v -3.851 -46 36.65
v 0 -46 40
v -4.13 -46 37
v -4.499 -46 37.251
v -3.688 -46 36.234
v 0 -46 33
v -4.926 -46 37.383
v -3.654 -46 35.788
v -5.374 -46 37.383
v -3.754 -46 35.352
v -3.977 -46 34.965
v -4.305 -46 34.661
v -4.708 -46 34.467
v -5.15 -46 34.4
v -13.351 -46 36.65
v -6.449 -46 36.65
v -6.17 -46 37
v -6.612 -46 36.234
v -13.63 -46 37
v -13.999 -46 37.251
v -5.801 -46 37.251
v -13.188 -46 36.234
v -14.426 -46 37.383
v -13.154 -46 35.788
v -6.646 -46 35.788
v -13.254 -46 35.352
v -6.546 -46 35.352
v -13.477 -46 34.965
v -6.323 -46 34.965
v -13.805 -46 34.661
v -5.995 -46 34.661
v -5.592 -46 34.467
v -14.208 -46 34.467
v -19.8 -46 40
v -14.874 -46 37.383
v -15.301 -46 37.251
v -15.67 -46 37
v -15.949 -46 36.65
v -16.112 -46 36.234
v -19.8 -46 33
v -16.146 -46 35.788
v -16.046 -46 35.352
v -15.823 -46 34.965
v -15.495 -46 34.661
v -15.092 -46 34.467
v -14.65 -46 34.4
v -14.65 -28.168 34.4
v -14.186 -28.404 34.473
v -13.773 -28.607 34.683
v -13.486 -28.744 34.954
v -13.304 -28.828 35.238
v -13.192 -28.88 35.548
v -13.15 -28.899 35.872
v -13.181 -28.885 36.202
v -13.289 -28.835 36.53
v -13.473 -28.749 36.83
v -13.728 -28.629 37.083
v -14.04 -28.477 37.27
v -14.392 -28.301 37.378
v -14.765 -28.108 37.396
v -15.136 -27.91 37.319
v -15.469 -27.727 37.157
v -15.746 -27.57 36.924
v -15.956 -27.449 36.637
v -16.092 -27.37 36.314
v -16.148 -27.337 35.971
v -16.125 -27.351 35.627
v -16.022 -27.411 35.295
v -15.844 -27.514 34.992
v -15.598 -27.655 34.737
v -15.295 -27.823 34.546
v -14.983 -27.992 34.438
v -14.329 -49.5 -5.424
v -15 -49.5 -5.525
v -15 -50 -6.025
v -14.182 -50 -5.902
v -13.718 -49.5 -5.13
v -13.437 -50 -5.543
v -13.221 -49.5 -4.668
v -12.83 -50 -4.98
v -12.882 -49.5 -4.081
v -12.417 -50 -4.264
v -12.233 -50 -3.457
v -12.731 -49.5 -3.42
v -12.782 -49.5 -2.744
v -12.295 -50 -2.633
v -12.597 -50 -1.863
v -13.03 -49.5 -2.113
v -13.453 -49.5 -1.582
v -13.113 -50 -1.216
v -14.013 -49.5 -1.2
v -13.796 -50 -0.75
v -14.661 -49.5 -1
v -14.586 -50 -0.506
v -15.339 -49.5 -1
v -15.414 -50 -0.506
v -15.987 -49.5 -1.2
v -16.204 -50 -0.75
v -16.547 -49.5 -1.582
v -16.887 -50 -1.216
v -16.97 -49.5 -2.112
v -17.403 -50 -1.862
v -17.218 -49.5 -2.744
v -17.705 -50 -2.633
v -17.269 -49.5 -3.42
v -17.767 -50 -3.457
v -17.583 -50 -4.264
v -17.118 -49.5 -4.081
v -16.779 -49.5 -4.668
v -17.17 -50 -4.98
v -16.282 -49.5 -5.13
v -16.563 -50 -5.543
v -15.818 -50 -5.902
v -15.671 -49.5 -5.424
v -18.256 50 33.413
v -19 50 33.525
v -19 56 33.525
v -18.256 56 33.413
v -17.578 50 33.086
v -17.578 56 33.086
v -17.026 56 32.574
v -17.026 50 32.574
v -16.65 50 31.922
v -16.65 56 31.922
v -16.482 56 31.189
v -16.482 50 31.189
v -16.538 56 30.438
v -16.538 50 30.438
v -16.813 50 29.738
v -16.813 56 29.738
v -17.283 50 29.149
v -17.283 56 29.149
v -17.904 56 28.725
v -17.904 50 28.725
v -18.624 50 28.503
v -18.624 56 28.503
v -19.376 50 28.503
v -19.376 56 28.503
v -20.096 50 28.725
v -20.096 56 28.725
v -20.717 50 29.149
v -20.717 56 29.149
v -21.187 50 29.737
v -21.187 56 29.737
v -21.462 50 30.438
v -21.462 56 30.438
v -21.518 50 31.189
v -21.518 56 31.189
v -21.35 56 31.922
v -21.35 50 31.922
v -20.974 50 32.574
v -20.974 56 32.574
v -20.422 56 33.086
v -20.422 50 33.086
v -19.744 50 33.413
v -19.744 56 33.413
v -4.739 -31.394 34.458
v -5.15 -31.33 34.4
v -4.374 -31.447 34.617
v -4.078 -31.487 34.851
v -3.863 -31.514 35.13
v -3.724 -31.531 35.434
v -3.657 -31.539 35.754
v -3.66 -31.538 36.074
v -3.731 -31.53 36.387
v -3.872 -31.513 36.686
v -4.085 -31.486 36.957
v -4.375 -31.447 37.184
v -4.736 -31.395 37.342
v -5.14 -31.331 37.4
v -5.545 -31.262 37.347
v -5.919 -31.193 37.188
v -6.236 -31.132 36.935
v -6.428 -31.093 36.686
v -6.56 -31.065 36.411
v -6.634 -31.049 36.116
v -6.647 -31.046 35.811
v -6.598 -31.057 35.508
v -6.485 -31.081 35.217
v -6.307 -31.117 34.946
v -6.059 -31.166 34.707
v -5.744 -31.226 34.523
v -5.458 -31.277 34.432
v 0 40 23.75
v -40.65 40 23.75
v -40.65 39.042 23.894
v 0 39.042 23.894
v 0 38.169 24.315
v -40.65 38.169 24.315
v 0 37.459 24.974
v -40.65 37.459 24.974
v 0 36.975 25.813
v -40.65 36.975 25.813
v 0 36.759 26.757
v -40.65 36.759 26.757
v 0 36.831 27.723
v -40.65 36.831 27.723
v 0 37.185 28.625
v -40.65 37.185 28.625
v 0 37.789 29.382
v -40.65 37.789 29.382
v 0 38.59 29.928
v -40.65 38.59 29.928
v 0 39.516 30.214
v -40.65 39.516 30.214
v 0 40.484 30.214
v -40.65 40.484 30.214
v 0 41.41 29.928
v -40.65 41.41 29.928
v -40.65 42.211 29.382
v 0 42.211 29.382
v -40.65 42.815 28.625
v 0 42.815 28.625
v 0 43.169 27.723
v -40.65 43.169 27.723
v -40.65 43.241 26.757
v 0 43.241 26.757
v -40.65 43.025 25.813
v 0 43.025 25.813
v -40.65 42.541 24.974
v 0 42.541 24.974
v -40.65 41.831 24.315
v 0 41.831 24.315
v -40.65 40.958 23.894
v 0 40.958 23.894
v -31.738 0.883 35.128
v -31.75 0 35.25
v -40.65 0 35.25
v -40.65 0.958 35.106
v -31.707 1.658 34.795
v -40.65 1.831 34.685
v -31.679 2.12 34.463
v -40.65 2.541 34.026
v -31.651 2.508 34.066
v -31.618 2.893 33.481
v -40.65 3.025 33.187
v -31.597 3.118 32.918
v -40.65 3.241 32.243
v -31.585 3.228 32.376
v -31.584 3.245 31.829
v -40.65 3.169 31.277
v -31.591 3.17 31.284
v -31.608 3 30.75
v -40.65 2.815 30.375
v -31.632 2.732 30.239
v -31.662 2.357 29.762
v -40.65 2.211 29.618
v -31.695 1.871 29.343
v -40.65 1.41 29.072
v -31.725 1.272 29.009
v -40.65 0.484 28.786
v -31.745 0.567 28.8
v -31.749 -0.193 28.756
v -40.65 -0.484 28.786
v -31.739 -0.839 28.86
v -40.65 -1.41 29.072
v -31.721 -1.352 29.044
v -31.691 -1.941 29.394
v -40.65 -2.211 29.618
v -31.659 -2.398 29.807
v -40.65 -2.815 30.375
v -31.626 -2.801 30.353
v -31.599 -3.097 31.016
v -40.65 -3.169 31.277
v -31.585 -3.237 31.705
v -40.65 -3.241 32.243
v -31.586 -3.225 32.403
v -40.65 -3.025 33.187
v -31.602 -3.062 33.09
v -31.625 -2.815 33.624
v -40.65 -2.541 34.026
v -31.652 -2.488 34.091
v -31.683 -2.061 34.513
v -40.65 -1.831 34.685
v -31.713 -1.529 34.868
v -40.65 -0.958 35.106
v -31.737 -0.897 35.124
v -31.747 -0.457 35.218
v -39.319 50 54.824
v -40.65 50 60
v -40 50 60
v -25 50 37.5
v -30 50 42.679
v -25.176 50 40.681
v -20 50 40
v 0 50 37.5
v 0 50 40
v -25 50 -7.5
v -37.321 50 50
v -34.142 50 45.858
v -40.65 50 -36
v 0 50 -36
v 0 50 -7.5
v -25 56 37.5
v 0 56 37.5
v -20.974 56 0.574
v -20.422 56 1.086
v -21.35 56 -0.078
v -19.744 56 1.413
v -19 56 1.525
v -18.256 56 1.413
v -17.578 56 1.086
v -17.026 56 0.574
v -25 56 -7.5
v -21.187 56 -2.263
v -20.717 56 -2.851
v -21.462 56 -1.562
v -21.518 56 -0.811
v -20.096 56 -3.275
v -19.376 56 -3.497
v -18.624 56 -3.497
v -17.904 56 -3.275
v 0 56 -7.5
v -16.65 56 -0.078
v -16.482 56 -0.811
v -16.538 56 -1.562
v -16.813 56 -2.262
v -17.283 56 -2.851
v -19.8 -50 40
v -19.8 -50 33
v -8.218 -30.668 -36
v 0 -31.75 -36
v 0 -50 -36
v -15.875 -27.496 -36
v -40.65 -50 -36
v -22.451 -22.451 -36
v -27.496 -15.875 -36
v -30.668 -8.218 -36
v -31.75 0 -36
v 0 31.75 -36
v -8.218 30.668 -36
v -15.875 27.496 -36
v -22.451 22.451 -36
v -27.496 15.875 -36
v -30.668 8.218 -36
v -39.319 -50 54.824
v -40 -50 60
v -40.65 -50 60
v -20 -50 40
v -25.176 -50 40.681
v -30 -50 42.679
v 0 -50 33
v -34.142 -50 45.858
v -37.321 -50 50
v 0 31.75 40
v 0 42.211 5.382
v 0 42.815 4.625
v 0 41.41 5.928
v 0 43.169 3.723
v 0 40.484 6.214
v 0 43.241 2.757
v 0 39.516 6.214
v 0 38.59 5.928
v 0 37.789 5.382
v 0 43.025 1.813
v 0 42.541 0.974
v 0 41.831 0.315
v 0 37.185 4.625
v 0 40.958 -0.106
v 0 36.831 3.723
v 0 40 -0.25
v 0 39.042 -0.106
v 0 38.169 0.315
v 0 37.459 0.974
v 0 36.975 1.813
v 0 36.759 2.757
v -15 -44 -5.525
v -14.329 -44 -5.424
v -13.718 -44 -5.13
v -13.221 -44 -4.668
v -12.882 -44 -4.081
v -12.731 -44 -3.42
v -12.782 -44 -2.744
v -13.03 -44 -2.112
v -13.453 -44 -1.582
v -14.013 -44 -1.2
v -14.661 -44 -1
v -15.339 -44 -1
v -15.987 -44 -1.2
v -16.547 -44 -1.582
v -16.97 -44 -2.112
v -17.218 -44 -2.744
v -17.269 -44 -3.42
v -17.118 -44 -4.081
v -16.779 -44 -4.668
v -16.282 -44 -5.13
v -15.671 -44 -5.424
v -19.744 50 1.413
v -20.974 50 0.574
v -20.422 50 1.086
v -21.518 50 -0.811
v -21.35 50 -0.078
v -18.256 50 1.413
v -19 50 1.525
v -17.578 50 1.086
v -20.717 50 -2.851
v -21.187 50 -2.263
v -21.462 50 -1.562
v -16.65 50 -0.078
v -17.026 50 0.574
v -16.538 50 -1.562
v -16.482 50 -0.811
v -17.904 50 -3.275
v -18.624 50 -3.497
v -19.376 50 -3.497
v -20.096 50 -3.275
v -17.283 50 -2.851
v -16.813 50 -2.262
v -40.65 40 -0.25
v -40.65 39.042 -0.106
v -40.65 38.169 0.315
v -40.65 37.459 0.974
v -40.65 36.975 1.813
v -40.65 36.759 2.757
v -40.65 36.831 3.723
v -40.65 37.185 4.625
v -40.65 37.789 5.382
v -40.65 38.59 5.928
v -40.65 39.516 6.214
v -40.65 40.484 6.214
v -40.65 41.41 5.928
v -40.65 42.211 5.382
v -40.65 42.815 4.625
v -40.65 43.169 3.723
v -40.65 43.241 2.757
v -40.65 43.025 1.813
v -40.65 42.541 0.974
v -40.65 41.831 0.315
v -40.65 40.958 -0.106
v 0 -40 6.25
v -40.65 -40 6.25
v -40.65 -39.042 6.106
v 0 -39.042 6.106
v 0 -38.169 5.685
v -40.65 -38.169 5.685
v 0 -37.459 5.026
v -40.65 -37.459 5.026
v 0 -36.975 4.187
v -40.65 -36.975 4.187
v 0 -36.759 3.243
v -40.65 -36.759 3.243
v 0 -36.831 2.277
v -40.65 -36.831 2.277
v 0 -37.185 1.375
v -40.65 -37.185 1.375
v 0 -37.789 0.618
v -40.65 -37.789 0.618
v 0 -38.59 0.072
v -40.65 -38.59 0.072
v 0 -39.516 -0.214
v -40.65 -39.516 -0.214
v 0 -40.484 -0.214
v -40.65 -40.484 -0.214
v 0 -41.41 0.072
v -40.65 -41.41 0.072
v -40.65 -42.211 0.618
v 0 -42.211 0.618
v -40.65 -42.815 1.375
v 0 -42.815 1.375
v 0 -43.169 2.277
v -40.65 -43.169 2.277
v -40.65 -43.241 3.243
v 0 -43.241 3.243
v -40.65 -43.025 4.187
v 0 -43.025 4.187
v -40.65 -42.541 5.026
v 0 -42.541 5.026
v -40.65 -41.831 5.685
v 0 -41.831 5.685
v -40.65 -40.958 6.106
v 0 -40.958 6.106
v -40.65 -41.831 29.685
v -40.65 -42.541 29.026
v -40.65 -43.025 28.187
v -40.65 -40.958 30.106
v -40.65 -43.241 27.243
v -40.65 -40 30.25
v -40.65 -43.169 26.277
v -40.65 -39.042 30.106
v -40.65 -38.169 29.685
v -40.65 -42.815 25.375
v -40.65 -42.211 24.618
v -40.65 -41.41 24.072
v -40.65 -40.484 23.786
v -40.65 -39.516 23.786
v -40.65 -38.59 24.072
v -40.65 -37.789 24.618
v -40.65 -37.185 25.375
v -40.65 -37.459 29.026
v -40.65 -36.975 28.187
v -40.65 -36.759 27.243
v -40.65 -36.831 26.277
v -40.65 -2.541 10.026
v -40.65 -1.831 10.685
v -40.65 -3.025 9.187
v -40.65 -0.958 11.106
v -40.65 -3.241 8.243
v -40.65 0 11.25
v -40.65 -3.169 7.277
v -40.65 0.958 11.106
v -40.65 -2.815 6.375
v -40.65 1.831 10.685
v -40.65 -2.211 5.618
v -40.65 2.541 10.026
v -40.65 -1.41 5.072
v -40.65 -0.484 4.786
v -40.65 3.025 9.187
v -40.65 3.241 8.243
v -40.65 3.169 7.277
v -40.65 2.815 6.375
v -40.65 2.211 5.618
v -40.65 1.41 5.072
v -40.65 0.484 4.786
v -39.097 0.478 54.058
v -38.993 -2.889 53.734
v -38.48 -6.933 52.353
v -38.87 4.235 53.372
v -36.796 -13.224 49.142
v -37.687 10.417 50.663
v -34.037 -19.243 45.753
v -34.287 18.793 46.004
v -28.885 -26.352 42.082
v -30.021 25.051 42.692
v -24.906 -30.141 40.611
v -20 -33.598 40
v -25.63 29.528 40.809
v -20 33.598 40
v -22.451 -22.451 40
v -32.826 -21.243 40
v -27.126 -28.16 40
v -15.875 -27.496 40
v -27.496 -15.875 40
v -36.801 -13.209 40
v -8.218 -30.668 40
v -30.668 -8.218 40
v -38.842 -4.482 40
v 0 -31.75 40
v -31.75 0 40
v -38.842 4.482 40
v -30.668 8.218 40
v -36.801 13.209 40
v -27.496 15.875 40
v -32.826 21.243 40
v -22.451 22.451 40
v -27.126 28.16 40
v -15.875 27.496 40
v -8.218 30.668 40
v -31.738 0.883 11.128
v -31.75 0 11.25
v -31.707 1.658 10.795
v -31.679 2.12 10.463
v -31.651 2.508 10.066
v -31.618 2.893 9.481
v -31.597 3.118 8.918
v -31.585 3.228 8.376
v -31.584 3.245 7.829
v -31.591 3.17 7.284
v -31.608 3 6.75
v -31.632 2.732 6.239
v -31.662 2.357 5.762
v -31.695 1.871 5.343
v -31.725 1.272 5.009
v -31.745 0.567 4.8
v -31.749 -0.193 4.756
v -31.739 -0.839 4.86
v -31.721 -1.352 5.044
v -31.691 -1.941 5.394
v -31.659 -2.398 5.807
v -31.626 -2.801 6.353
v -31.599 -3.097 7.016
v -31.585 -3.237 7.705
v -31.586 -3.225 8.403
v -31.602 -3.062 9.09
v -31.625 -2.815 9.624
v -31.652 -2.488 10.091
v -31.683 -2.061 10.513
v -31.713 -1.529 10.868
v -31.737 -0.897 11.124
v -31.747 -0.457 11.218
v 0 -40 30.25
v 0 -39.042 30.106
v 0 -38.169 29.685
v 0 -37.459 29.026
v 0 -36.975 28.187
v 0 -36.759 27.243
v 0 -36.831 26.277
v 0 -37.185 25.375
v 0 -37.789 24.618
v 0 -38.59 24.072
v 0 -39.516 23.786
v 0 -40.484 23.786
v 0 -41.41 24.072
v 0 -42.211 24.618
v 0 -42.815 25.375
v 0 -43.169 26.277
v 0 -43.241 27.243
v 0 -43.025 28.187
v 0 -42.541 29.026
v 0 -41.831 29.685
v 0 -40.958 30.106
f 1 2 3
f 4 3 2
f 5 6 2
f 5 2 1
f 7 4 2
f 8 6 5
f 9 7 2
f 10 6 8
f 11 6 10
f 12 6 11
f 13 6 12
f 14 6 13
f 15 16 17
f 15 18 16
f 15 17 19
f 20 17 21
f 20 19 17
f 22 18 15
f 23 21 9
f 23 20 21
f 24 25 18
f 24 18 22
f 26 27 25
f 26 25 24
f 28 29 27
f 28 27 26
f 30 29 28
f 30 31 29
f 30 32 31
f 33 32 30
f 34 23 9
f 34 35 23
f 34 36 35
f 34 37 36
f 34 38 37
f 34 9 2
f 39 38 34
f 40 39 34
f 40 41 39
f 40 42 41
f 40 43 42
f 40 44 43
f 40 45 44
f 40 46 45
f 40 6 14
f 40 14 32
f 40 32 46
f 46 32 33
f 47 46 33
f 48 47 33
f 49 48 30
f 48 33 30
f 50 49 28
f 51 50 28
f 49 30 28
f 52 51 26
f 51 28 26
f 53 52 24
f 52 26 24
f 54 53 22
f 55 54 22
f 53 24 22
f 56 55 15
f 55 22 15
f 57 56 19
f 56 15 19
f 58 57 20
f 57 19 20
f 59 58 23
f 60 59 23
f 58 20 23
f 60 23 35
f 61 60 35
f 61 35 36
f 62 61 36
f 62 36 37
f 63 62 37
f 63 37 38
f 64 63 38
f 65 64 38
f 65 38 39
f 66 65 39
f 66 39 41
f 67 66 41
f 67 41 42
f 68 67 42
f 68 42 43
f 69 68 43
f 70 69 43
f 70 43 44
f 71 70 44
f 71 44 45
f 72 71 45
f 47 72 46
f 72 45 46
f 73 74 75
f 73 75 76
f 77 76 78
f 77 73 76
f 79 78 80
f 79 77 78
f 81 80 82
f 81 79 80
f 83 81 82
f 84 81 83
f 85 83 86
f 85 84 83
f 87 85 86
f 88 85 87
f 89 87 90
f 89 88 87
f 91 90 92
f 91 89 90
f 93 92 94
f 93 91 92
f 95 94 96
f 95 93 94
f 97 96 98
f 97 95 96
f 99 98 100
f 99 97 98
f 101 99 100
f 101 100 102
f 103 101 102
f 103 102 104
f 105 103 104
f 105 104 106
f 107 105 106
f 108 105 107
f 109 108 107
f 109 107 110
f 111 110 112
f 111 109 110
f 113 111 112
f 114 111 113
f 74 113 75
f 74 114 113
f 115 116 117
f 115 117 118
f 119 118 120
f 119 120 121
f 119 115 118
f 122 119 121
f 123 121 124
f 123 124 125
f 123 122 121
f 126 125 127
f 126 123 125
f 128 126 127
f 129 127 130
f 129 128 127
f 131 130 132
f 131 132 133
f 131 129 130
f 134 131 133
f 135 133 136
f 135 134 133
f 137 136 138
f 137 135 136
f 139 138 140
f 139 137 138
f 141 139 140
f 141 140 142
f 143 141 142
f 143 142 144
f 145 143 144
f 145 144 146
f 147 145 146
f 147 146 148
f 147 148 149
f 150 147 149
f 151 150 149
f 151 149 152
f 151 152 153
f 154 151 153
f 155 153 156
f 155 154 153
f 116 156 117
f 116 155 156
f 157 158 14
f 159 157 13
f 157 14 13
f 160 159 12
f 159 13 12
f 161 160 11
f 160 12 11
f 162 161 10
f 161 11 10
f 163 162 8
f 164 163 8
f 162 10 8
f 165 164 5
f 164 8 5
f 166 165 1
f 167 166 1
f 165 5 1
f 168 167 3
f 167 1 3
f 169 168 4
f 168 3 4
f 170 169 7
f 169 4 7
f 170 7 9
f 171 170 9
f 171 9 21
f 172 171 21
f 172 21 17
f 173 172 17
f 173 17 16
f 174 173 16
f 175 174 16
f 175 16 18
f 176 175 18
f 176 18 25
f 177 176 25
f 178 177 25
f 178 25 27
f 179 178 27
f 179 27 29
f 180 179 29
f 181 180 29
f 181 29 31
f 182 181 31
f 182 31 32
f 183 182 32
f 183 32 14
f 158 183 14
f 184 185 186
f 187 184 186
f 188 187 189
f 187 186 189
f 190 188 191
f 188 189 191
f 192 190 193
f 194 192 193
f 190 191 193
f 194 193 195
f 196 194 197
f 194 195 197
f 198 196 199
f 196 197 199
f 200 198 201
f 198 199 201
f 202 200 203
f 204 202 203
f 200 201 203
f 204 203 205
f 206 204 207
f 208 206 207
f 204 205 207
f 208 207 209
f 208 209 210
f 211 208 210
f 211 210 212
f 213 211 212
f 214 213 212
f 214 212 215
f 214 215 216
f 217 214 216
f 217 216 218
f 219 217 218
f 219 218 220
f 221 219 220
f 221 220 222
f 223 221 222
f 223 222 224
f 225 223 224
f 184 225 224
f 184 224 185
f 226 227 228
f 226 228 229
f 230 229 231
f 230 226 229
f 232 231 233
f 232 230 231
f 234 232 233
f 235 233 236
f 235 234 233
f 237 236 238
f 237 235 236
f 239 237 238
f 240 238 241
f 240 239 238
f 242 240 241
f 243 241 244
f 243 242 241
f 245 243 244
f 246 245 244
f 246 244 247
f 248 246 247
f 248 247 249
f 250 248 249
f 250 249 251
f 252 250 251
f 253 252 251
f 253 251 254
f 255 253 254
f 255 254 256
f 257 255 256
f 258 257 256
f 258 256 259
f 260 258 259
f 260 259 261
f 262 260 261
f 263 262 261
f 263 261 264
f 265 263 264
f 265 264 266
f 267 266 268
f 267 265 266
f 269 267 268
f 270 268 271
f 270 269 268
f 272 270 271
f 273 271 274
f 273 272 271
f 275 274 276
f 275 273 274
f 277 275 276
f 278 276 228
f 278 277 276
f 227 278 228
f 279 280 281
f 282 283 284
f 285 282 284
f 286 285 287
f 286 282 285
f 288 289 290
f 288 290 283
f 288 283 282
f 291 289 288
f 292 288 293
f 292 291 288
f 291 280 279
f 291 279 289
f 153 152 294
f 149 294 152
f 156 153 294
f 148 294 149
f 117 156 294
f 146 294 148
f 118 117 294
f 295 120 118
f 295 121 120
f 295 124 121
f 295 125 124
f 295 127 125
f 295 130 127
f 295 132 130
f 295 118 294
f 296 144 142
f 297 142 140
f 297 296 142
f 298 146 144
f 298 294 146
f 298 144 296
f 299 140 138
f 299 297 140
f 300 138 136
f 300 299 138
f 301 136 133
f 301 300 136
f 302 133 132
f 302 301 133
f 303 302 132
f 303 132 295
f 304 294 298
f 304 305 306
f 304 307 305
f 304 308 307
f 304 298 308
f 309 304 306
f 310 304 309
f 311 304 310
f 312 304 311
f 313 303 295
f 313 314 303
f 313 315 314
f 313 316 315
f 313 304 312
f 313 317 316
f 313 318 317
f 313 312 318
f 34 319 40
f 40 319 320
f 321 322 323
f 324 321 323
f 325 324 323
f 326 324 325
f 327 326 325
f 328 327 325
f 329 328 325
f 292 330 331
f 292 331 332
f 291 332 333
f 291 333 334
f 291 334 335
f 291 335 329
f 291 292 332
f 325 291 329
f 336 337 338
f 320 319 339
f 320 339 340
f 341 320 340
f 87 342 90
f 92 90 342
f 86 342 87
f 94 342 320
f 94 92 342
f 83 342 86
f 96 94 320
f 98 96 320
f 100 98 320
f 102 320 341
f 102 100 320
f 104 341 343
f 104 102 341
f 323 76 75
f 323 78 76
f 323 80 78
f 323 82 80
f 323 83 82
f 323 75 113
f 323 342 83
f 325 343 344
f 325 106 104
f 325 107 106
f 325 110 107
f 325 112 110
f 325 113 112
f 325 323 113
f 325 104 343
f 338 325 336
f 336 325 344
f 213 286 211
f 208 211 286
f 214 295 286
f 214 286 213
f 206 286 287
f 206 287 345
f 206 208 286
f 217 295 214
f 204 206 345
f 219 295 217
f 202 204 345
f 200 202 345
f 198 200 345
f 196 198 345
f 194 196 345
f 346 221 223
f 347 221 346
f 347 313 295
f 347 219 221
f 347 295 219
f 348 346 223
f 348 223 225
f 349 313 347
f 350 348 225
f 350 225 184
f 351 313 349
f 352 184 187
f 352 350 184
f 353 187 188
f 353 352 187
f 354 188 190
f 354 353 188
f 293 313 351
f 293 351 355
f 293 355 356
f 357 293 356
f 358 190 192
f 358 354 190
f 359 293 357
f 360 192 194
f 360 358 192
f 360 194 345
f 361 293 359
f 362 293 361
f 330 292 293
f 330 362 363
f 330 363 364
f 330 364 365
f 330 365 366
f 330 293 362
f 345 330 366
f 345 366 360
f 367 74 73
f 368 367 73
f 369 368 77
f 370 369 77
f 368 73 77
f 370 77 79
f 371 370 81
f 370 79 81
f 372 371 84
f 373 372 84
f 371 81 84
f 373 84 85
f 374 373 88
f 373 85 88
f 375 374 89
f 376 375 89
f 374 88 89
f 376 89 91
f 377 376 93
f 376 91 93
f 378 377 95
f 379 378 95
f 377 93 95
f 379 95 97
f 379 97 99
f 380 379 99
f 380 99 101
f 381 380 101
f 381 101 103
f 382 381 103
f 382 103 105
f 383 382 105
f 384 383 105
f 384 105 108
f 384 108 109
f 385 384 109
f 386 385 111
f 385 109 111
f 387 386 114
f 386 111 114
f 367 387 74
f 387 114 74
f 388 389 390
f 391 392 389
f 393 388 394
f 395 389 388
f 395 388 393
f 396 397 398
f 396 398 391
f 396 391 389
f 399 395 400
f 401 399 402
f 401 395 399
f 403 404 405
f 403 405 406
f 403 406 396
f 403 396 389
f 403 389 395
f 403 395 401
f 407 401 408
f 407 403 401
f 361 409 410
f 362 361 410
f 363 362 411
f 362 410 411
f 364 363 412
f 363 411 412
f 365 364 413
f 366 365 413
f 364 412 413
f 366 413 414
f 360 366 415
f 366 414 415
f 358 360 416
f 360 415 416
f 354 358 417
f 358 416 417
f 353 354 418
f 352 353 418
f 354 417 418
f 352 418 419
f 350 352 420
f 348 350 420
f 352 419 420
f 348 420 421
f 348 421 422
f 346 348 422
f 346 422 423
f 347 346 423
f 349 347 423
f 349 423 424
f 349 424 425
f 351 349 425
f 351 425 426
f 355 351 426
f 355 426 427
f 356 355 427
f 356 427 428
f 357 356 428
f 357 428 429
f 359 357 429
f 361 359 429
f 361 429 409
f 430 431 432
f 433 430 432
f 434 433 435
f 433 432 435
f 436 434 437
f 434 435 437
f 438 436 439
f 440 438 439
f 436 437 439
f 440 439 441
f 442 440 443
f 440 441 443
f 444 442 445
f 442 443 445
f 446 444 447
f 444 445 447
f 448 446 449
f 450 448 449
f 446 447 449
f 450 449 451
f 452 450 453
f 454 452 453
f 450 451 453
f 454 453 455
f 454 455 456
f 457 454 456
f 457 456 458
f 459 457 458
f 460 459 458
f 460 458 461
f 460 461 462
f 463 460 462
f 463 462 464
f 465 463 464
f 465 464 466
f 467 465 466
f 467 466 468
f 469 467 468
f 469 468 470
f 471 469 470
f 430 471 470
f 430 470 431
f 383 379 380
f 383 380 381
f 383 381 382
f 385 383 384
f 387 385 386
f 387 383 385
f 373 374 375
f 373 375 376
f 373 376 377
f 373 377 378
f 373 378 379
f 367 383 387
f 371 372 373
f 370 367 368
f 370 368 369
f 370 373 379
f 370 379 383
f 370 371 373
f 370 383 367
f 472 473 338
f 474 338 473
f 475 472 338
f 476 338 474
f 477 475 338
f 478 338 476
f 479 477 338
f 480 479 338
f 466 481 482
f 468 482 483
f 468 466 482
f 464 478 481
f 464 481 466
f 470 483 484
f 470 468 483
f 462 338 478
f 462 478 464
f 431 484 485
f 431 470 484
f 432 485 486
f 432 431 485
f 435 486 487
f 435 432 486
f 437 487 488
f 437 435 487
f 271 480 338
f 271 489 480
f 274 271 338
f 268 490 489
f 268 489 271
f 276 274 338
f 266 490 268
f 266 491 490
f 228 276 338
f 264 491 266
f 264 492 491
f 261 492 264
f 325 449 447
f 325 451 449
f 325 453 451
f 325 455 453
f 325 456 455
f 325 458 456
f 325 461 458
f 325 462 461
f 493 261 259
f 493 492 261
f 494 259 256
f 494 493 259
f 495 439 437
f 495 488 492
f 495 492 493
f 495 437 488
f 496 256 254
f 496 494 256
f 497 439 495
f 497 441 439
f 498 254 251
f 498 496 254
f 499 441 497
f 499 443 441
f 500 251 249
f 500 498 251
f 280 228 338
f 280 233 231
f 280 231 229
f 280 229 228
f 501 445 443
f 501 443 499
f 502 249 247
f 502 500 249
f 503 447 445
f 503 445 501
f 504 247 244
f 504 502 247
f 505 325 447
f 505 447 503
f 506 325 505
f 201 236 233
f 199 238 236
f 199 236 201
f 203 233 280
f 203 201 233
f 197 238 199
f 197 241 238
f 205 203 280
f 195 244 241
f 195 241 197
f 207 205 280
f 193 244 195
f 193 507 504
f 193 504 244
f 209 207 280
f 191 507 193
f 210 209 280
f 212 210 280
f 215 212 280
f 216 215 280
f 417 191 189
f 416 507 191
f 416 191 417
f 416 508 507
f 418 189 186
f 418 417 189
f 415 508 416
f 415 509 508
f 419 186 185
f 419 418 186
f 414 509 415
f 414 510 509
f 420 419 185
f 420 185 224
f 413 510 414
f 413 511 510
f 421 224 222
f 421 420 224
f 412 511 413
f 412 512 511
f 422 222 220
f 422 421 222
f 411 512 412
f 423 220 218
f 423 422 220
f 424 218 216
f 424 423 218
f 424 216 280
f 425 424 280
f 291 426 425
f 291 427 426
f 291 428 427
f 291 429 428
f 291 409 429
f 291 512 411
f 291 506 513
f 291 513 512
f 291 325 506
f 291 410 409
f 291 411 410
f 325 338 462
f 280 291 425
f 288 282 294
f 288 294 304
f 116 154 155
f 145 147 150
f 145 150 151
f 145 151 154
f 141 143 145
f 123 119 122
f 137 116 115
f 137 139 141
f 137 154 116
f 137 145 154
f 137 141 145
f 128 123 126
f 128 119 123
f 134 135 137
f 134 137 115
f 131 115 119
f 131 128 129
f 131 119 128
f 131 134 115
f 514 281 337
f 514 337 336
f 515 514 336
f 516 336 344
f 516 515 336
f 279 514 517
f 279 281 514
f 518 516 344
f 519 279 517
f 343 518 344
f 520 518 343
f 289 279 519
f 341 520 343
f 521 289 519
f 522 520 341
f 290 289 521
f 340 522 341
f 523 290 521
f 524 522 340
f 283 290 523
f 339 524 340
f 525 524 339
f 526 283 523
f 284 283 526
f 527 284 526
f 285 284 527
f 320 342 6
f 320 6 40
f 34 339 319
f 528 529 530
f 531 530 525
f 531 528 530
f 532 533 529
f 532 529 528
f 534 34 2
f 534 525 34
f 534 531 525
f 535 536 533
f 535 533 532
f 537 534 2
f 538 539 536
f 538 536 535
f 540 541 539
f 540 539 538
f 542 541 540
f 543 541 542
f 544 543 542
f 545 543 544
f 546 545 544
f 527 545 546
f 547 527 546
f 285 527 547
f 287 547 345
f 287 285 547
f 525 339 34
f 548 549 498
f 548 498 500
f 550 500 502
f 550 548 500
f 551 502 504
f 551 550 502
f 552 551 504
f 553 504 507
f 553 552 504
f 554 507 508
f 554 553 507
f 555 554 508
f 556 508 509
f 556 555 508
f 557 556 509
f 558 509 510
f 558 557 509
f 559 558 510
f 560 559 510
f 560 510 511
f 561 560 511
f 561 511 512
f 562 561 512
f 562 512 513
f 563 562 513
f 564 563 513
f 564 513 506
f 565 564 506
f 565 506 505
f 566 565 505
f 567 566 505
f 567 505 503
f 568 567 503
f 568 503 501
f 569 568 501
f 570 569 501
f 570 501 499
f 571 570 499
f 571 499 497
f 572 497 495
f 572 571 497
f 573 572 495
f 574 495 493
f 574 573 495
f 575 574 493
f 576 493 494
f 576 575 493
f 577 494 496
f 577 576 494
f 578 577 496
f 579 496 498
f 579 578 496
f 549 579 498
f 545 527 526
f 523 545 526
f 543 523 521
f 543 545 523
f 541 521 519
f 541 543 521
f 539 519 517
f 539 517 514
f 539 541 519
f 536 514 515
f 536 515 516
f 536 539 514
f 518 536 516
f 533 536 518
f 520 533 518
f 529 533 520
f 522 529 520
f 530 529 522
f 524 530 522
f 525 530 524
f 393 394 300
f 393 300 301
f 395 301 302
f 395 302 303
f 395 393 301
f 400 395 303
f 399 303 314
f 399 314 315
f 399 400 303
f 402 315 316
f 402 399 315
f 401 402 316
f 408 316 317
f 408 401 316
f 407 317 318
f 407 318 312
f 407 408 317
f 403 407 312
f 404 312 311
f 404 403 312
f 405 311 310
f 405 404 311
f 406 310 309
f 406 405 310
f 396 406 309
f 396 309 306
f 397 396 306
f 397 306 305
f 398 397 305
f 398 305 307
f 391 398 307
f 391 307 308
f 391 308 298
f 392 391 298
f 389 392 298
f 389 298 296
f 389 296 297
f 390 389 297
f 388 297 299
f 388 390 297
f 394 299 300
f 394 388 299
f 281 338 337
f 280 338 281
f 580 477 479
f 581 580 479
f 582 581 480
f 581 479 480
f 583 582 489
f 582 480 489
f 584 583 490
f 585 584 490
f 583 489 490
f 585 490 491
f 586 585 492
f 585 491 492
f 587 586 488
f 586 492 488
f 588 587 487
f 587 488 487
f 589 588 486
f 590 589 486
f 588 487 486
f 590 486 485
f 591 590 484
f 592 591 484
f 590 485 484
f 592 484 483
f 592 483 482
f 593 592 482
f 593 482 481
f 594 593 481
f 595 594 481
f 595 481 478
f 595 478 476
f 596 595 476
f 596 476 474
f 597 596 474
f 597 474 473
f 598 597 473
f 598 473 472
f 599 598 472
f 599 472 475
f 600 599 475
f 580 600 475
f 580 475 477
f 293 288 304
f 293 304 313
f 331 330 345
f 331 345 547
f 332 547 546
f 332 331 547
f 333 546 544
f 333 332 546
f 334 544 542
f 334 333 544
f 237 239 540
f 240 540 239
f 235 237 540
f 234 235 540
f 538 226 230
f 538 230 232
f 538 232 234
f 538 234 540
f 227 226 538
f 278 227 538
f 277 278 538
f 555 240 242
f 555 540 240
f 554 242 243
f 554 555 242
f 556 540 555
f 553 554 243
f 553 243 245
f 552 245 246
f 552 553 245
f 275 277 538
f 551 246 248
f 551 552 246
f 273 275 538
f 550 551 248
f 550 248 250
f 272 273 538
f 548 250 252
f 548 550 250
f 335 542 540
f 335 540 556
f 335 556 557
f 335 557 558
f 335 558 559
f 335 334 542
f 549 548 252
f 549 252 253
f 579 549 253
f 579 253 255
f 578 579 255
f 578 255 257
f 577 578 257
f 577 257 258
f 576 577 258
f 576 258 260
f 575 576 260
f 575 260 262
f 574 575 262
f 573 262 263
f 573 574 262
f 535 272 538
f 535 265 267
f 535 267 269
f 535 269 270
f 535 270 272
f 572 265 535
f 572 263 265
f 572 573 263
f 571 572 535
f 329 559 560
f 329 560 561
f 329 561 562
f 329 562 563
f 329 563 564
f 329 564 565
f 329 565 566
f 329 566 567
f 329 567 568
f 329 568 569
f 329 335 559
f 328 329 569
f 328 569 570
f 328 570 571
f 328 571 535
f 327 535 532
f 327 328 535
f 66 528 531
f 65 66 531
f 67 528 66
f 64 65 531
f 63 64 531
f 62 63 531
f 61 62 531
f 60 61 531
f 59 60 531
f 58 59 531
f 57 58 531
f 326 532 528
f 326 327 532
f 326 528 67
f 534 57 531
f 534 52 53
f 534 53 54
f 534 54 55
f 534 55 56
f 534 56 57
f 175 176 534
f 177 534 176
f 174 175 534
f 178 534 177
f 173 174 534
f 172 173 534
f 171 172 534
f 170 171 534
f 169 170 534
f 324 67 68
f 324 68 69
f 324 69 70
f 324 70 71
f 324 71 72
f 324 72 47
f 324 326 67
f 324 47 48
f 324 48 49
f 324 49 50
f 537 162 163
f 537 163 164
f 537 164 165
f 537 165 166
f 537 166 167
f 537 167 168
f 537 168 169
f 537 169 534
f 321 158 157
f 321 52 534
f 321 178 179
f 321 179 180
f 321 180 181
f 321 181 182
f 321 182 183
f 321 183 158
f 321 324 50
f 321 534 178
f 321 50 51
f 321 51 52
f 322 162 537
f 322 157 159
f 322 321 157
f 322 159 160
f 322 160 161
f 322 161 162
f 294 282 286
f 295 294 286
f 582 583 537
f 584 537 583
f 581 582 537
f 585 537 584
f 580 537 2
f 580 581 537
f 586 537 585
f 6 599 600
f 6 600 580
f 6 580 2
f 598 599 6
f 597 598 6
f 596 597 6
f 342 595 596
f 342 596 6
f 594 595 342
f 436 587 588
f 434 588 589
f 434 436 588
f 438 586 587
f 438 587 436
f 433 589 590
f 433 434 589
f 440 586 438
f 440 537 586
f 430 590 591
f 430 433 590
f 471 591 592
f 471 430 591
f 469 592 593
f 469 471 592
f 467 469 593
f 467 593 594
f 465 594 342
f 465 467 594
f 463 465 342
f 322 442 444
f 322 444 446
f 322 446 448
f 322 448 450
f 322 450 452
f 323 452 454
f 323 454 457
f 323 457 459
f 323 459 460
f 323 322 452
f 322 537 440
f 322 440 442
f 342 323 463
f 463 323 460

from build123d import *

# Parameters (mm, degrees)
CENTRE_HOLE_FOR_L2_DEPTH      = 40
CENTRE_HOLE_FOR_L2_DEPTH_BACK = 10
SKETCH1_R                     = 39.1
SKETCH1_R_2                   = 31.75
MAIN_STRUCTURE_DEPTH          = 60
MAIN_STRUCTURE_DEPTH_BACK     = 50
SKETCH2_W                     = 100
SKETCH2_H                     = 100
SKETCH2_R                     = 39.1
BEARING_CURVE_DEPTH           = 10
SKETCH6_R                     = 10.5
SHAFT_HOLE_DEPTH              = 10
WRIST_CUTOUT_DEPTH            = 188.082869339
SKETCH11_W                    = 25
SKETCH11_H                    = 45
SKETCH11_R                    = 2.525
BOSS_EXTRUDE1_DEPTH           = 6
SKETCH15_W                    = 19.8
SKETCH15_H                    = 7
CUT_EXTRUDE4_DEPTH            = 4
CUT_EXTRUDE5_REACH            = 190.16
CUT_EXTRUDE5_END_RADIUS       = 31.75
SKETCH16_R                    = 1.5
CUT_EXTRUDE6_DEPTH            = 168.7378908
CUT_EXTRUDE6_DEPTH_BACK       = 168.7378908
SKETCH18_R                    = 3.25
CUT_EXTRUDE7_START            = -1.5875
CUT_EXTRUDE7_DEPTH            = 1.5875
SKETCH9_R                     = 12.05
BEARING_DEPTH                 = 5
CUT_EXTRUDE8_DEPTH            = 3
SKETCH21_R                    = 3.25
SKETCH21_R_2                  = 1.65
CUT_EXTRUDE9_DEPTH            = 167.868211501
CUT_EXTRUDE10_DEPTH           = 6.35
SKETCH23_R                    = 2.275
CUT_EXTRUDE11_DEPTH           = 6
CHAMFER1_SIZE                 = 0.5
BOSS_EXTRUDE2_START           = 26
BOSS_EXTRUDE2_DEPTH           = 26


with BuildPart() as part:
    # Sketch1 → Centre Hole for L2 (new, two sides: drawn at the far end of the back side and taken through both)
    with BuildSketch(Plane.XY.offset(-CENTRE_HOLE_FOR_L2_DEPTH_BACK)):
        Circle(SKETCH1_R)
        Circle(SKETCH1_R_2, mode=Mode.SUBTRACT)
    extrude(amount=CENTRE_HOLE_FOR_L2_DEPTH + CENTRE_HOLE_FOR_L2_DEPTH_BACK)

    # Sketch2 → Main Structure (add, two sides: drawn at the far end of the back side and taken through both)
    with BuildSketch(Plane.XY.offset(40).offset(-MAIN_STRUCTURE_DEPTH_BACK)):
        Rectangle(SKETCH2_W, SKETCH2_H)
        Circle(SKETCH2_R, mode=Mode.SUBTRACT)
    extrude(amount=MAIN_STRUCTURE_DEPTH + MAIN_STRUCTURE_DEPTH_BACK)

    # Sketch3 → Bearing Curve (add)
    with BuildSketch(Plane.ZY.offset(50)):
        with BuildLine():
            Line((100, 50), (100, -50))
            ThreePointArc((100, -50), (150, 0), (100, 50))
        make_face()
    bearing_curve = extrude(amount=-BEARING_CURVE_DEPTH)

    # Upright Mirror: Bearing Curve across plane
    add(bearing_curve.mirror(Plane(origin=(0, 0, 0), x_dir=(0, 0, 1), z_dir=(1, 0, 0))))

    # Sketch6 → Shaft Hole (cut)
    with BuildSketch(Plane.ZY.offset(50)):
        with Locations((100, 0)):
            Circle(SKETCH6_R)
    extrude(amount=-SHAFT_HOLE_DEPTH, mode=Mode.SUBTRACT)

    # Sketch4 → Wrist Cutout (cut, through all)
    with BuildSketch(Plane(origin=(0, 50, 0), x_dir=(1, 0, 0), z_dir=(0, 1, 0))):
        with BuildLine():
            Line((-40, -100), (-40, -60))
            ThreePointArc((-40, -60), (-34.142135624, -45.857864376), (-20, -40))
            Line((-20, -40), (20, -40))
            ThreePointArc((20, -40), (34.142135624, -45.857864376), (40, -60))
            Line((40, -60), (40, -100))
            Line((40, -100), (-40, -100))
        make_face()
    extrude(amount=-WRIST_CUTOUT_DEPTH, mode=Mode.SUBTRACT)

    # SurfaceCut1
    split(bisect_by=Plane.ZY, keep=Keep.TOP)

    # Sketch11 → Boss-Extrude1 (add)
    with BuildSketch(Plane(origin=(0, 50, 0), x_dir=(1, 0, 0), z_dir=(0, 1, 0))):
        with Locations((-12.5, -15)):
            Rectangle(SKETCH11_W, SKETCH11_H)
        with Locations(Location((-19, 1, 0), (0, 0, 270))):
            Circle(SKETCH11_R, mode=Mode.SUBTRACT)
        with Locations(Location((-19, -31, 0), (0, 0, 270))):
            Circle(SKETCH11_R, mode=Mode.SUBTRACT)
    extrude(amount=BOSS_EXTRUDE1_DEPTH)

    # Sketch15 → Cut-Extrude4 (cut)
    with BuildSketch(Plane(origin=(0, -50, 0), x_dir=(-1, 0, 0), z_dir=(0, -1, 0))):
        with Locations((9.9, -36.5)):
            Rectangle(SKETCH15_W, SKETCH15_H)
    extrude(amount=-CUT_EXTRUDE4_DEPTH, mode=Mode.SUBTRACT)

    # Cut-Extrude5: up to this cylinder (the profile starts outside it)
    cut_extrude5_end = Plane(origin=(0, 0, 35.9), z_dir=(0, 0, 1)) * Cylinder(CUT_EXTRUDE5_END_RADIUS, 444.82, mode=Mode.PRIVATE)
    # Sketch16 → Cut-Extrude5 (cut, up to the surface)
    with BuildSketch(Plane(origin=(0, -46, 0), x_dir=(-1, 0, 0), z_dir=(0, -1, 0)), mode=Mode.PRIVATE) as cut_extrude5_sk1:
        with Locations(Location((14.65, -35.9, 0), (0, 0, 90))):
            Circle(SKETCH16_R)
    cut_extrude5_tool1 = extrude(cut_extrude5_sk1.sketch, amount=-CUT_EXTRUDE5_REACH, mode=Mode.PRIVATE) - cut_extrude5_end
    add(cut_extrude5_tool1.solids().sort_by_distance((-14.65, -46, 35.9))[0], mode=Mode.SUBTRACT)
    # Sketch16 → Cut-Extrude5 (cut, up to the surface)
    with BuildSketch(Plane(origin=(0, -46, 0), x_dir=(-1, 0, 0), z_dir=(0, -1, 0)), mode=Mode.PRIVATE) as cut_extrude5_sk2:
        with Locations(Location((5.15, -35.9, 0), (0, 0, 90))):
            Circle(SKETCH16_R)
    cut_extrude5_tool2 = extrude(cut_extrude5_sk2.sketch, amount=-CUT_EXTRUDE5_REACH, mode=Mode.PRIVATE) - cut_extrude5_end
    add(cut_extrude5_tool2.solids().sort_by_distance((-5.15, -46, 35.9))[0], mode=Mode.SUBTRACT)

    # Sketch18 → Cut-Extrude6 (cut, two sides: drawn at the far end of the back side and taken through both)
    with BuildSketch(Plane.ZY.offset(50).offset(-CUT_EXTRUDE6_DEPTH_BACK)):
        with Locations((8, 0)):
            Circle(SKETCH18_R)
        with Locations((32, 0)):
            Circle(SKETCH18_R)
    extrude(amount=CUT_EXTRUDE6_DEPTH + CUT_EXTRUDE6_DEPTH_BACK, mode=Mode.SUBTRACT)

    # Sketch19 → Cut-Extrude7 (cut)
    with BuildSketch(Plane(origin=(-40, 0, 0), x_dir=(0, 0, -1), z_dir=(1, 0, 0)).offset(CUT_EXTRUDE7_START)):
        with BuildLine():
            Line((-60, 50), (-100, 50))
            ThreePointArc((-100, 50), (-150, 0), (-100, -50))
            Line((-100, -50), (-60, -50))
            Line((-60, -50), (-60, 50))
        make_face()
    extrude(amount=CUT_EXTRUDE7_DEPTH, mode=Mode.SUBTRACT)

    # Sketch9 → Bearing (cut)
    with BuildSketch(Plane(origin=(-41.5875, 0, 0), x_dir=(0, 0, -1), z_dir=(1, 0, 0))):
        with Locations((-100, 0)):
            Circle(SKETCH9_R)
    extrude(amount=-BEARING_DEPTH, mode=Mode.SUBTRACT)

    # Sketch20 → Cut-Extrude8 (cut)
    with BuildSketch(Plane.ZY.offset(50)):
        with BuildLine():
            Line((-10, -50), (100, -50))
            ThreePointArc((100, -50), (150, 0), (100, 50))
            Line((100, 50), (-10, 50))
            Line((-10, 50), (-10, -50))
        make_face()
    extrude(amount=-CUT_EXTRUDE8_DEPTH, mode=Mode.SUBTRACT)

    # Sketch21 → Cut-Extrude9 (cut, through all)
    with BuildSketch(Plane.ZY.offset(47)):
        with Locations((3, -40)):
            Circle(SKETCH21_R)
        with Locations((27, -40)):
            Circle(SKETCH21_R)
        with Locations(Location((27, 40, 0), (0, 0, 180))):
            Circle(SKETCH21_R)
        with Locations(Location((3, 40, 0), (0, 0, 180))):
            Circle(SKETCH21_R)
        with Locations((125, 0)):
            Circle(SKETCH21_R_2)
    extrude(amount=-CUT_EXTRUDE9_DEPTH, mode=Mode.SUBTRACT)

    # Sketch22 → Cut-Extrude10 (cut)
    with BuildSketch(Plane.ZY.offset(47)):
        with BuildLine():
            Line((-10, 50), (-10, -50))
            Line((-10, -50), (100, -50))
            ThreePointArc((100, -50), (150, 0), (100, 50))
            Line((100, 50), (-10, 50))
        make_face()
    extrude(amount=-CUT_EXTRUDE10_DEPTH, mode=Mode.SUBTRACT)

    # Sketch23 → Cut-Extrude11 (cut)
    with BuildSketch(Plane(origin=(0, -50, 0), x_dir=(-1, 0, 0), z_dir=(0, -1, 0))):
        with Locations(Location((15, 3.25, 0), (0, 0, 90))):
            Circle(SKETCH23_R)
    extrude(amount=-CUT_EXTRUDE11_DEPTH, mode=Mode.SUBTRACT)

    # Chamfer1
    chamfer1_edges = [part.edges().sort_by_distance(p)[0] for p in [
        (-15, -50, -0.975),
    ]]
    chamfer(chamfer1_edges, length=CHAMFER1_SIZE)

    # Sketch24 → Boss-Extrude2 (add)
    with BuildSketch(Plane(origin=(0, 0, -10), x_dir=(-1, 0, 0), z_dir=(0, 0, -1)).offset(BOSS_EXTRUDE2_START)):
        with BuildLine():
            Line((40.65, -50), (40.65, 50))
            Line((40.65, 50), (0, 50))
            Line((0, 50), (0, 31.75))
            ThreePointArc((0, 31.75), (31.75, 0), (0, -31.75))
            Line((0, -31.75), (0, -50))
            Line((0, -50), (40.65, -50))
        make_face()
    extrude(amount=-BOSS_EXTRUDE2_DEPTH)


solid = part.part
